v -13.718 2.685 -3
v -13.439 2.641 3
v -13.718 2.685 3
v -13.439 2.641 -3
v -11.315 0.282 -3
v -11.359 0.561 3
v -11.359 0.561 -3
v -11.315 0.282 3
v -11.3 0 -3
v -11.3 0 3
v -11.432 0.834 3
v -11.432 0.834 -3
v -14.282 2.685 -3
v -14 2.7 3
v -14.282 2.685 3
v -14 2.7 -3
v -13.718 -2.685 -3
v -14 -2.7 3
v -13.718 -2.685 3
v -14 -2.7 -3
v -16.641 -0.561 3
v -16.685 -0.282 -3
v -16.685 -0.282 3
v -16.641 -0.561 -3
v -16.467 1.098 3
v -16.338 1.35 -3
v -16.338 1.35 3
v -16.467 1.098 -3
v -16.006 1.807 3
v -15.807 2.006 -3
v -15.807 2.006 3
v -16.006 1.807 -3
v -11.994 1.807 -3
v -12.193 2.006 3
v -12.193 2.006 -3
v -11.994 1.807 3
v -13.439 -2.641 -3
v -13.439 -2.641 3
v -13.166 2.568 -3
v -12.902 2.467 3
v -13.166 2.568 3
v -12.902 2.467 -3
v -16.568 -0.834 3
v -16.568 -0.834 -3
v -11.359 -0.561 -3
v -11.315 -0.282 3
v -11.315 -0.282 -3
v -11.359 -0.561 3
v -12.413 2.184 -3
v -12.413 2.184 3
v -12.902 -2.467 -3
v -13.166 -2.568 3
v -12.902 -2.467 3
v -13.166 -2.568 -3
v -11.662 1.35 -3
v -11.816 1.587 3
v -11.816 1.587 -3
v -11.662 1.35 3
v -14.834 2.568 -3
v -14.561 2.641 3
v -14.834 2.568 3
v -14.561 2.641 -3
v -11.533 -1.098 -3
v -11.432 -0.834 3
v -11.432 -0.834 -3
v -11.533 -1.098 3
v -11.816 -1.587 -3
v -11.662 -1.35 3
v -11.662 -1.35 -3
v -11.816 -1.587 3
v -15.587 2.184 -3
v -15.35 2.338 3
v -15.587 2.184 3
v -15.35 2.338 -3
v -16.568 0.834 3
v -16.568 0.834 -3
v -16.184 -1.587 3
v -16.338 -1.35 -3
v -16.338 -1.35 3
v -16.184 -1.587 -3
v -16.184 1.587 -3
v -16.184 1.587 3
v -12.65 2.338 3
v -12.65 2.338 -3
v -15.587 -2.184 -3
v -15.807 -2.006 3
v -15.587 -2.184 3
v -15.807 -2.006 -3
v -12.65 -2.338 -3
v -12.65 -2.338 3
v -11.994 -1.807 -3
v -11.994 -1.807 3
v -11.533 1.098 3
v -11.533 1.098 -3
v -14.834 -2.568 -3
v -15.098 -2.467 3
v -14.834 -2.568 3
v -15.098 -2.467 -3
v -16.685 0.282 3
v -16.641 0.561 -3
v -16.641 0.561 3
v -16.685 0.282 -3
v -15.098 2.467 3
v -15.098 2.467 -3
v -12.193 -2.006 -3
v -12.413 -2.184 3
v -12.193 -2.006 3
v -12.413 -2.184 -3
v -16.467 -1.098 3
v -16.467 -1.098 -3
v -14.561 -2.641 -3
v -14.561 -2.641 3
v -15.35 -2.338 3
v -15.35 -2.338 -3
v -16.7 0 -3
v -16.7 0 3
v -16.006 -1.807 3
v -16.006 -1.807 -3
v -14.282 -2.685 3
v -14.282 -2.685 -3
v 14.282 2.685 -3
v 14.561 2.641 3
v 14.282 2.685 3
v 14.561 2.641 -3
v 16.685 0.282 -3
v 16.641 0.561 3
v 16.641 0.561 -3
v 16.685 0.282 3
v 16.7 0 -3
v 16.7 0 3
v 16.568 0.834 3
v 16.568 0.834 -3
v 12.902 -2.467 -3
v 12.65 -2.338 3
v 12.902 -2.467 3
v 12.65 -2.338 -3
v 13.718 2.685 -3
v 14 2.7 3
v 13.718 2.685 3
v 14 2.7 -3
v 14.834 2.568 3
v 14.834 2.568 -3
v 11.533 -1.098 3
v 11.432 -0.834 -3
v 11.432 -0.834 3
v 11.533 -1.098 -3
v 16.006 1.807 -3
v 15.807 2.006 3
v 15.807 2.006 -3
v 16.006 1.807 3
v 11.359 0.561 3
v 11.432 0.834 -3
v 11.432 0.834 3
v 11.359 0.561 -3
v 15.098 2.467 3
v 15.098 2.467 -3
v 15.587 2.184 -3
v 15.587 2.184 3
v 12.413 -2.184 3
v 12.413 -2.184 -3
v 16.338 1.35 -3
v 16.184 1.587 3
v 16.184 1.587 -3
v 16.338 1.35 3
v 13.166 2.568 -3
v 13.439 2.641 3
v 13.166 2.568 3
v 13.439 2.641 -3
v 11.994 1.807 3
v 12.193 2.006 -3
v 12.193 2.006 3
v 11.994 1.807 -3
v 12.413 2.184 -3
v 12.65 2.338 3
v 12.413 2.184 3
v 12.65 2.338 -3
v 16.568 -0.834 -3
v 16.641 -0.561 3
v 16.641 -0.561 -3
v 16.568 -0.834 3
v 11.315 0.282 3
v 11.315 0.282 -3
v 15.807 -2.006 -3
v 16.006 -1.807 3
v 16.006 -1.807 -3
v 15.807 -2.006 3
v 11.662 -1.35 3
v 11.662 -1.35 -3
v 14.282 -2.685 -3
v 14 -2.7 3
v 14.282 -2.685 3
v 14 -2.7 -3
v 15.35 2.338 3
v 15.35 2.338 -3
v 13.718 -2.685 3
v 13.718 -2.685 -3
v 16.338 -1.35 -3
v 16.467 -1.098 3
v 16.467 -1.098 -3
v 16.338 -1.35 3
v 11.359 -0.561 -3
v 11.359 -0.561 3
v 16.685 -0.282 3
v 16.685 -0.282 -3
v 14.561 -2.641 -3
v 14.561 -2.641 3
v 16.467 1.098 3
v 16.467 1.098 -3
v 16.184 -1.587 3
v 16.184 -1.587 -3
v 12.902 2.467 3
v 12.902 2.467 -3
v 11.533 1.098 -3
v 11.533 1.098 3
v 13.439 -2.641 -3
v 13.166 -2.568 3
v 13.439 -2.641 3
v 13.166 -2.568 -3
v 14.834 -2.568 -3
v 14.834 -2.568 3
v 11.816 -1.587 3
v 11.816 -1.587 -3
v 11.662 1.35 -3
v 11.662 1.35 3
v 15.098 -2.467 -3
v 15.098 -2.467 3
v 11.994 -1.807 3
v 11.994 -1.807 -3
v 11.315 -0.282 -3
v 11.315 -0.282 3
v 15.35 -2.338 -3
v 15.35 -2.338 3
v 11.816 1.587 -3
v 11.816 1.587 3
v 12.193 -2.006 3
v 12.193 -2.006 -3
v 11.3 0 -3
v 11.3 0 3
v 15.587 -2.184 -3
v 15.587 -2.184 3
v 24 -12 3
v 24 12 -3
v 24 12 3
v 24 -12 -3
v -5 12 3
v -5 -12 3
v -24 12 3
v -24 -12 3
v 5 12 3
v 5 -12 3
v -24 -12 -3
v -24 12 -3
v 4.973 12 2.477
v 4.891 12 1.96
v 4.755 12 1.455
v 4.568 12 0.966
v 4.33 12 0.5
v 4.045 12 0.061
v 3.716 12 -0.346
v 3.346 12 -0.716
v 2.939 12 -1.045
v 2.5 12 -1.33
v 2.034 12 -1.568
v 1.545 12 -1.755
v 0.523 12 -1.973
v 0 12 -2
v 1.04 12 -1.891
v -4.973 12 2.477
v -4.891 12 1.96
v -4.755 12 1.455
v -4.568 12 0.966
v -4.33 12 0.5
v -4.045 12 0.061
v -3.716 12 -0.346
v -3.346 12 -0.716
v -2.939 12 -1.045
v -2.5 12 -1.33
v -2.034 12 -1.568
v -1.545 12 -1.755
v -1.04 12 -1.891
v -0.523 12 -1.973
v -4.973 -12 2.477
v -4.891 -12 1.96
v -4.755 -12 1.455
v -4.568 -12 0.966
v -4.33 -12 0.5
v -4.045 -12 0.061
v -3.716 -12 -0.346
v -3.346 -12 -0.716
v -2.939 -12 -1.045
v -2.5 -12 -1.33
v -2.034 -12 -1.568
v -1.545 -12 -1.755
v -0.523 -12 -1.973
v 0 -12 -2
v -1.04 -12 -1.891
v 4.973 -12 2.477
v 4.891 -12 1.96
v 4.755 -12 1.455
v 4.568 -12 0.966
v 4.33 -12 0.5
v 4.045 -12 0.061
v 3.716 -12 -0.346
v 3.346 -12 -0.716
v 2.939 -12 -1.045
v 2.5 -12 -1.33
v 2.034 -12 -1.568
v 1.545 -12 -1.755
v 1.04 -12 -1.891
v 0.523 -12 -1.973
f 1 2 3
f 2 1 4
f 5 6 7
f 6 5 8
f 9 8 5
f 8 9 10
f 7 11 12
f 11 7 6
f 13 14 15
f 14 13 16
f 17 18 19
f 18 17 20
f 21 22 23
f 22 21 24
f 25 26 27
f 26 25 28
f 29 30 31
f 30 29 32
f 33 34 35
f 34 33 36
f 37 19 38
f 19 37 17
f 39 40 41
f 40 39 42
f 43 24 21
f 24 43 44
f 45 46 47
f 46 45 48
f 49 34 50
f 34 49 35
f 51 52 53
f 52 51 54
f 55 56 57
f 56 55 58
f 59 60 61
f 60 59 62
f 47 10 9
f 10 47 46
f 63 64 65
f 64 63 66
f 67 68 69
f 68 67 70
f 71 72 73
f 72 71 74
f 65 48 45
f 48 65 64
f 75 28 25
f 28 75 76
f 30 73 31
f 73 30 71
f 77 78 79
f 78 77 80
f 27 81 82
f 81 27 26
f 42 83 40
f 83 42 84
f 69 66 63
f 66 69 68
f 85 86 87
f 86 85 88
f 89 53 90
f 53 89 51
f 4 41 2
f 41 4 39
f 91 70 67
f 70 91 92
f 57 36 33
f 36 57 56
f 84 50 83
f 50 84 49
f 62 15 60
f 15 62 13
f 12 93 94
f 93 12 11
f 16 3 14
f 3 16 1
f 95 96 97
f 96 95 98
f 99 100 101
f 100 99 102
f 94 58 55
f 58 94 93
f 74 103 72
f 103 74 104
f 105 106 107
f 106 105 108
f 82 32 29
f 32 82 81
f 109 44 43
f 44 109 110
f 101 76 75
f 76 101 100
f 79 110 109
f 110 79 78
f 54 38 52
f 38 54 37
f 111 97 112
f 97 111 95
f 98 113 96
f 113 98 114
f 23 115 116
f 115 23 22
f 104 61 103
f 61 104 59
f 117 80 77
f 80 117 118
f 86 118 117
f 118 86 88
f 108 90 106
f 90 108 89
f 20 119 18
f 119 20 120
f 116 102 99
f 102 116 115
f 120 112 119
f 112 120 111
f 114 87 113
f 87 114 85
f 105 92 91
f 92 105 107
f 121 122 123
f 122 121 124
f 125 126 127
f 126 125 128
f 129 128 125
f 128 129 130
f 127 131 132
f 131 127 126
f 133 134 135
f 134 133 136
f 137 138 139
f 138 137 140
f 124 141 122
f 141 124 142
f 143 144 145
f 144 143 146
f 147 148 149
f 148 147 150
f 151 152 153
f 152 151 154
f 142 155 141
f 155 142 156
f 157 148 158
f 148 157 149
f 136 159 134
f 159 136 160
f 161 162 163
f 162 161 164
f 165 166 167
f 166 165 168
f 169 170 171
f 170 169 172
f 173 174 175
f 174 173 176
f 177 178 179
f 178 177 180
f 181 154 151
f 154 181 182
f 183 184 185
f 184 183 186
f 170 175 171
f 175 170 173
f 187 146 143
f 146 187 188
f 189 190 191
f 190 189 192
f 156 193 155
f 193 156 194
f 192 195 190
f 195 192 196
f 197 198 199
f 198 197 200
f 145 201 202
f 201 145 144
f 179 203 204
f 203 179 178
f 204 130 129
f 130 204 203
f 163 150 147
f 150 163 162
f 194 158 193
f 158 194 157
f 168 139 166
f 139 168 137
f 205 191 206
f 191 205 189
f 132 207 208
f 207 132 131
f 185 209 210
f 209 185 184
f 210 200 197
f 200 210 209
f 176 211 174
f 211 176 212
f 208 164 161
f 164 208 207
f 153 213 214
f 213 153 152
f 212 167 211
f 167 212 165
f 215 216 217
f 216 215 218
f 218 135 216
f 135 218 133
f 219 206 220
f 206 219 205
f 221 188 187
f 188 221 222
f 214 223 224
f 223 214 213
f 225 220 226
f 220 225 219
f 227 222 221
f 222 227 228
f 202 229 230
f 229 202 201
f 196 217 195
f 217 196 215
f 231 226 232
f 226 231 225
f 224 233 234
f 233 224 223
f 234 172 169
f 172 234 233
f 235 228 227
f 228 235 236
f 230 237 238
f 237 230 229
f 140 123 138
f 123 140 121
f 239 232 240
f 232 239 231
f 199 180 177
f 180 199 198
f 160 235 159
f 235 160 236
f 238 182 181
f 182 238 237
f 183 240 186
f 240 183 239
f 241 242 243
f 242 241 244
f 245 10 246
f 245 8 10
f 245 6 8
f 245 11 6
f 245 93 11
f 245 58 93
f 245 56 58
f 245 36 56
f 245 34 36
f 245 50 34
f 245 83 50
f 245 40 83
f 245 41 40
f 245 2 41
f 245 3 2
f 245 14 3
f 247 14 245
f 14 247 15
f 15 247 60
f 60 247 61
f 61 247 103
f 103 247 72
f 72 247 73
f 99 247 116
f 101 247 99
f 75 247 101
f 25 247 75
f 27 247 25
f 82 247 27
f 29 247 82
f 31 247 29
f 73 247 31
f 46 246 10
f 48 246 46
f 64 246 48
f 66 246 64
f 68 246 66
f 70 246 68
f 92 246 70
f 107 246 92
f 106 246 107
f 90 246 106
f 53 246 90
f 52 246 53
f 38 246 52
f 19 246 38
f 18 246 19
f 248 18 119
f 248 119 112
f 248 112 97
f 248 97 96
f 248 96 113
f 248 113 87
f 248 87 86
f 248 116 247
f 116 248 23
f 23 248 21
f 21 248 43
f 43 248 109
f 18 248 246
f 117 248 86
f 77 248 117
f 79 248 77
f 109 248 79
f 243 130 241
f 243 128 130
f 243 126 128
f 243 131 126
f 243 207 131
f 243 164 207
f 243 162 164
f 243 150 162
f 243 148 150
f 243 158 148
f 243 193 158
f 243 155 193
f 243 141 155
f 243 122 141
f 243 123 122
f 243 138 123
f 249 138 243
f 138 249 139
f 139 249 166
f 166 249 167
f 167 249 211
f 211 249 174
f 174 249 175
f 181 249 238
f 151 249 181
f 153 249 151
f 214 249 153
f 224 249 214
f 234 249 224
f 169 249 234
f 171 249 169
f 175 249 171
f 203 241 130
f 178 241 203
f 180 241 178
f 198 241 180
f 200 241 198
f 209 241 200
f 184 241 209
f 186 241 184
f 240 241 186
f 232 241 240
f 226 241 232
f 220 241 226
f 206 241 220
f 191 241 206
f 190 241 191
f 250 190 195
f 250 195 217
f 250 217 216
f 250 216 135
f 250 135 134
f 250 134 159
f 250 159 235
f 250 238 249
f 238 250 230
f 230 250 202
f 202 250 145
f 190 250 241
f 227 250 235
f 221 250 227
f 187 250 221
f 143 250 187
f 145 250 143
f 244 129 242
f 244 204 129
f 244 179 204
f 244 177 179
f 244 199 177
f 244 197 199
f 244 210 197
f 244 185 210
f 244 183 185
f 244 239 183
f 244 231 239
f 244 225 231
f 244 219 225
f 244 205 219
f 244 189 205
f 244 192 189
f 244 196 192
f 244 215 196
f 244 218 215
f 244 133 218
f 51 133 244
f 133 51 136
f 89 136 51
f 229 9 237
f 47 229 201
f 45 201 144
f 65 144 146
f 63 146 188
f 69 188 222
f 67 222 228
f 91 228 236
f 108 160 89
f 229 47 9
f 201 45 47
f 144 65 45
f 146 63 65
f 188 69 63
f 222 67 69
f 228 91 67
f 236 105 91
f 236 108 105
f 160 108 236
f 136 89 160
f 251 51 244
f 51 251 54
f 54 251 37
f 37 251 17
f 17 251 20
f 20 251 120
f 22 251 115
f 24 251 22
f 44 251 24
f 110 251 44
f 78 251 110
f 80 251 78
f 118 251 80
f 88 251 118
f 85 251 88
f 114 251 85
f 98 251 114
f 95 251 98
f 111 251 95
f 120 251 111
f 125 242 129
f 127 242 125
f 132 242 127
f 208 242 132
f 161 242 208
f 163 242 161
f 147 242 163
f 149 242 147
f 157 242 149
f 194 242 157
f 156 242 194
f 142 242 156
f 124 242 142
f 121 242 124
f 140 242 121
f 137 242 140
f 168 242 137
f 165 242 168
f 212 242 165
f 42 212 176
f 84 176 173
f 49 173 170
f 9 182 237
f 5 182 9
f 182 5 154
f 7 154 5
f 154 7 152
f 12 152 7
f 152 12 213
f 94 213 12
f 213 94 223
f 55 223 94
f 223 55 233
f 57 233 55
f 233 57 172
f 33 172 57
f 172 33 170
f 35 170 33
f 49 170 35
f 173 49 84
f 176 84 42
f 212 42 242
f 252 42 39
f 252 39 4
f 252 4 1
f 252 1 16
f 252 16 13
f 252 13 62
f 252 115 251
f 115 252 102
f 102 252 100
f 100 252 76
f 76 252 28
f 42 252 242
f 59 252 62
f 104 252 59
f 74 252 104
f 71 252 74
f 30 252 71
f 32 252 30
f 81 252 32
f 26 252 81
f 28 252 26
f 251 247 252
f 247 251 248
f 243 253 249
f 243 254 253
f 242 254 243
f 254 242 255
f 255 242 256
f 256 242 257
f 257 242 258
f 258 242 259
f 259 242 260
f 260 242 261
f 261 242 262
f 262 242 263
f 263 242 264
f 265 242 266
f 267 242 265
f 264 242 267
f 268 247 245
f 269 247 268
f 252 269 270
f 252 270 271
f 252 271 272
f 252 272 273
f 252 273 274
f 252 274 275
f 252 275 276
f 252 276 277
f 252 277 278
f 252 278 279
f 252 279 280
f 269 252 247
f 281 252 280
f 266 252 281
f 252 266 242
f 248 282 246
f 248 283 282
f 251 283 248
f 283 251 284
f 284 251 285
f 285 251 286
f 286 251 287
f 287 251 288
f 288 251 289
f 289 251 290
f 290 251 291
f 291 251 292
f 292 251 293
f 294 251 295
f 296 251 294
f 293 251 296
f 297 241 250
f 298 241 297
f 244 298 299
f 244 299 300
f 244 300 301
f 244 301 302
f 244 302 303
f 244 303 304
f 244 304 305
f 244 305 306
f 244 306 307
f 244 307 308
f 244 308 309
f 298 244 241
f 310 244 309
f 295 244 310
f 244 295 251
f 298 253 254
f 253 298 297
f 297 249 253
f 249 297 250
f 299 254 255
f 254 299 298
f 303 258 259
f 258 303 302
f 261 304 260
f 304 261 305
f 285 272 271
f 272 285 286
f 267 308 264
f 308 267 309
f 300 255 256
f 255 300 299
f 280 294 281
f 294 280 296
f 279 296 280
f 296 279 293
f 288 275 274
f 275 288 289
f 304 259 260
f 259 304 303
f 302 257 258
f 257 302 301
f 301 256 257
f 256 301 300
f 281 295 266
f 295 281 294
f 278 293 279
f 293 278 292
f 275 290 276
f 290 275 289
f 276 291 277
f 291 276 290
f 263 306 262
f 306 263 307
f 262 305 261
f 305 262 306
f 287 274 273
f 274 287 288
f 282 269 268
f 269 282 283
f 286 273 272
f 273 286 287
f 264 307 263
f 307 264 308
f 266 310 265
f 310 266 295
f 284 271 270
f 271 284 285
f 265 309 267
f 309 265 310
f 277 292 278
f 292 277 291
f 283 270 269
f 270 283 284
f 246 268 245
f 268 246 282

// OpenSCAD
// Saddle clamp base for round tube.
$fn = 60;
eps = 0.02;
pipe_d = 10;
base_l = 48;
base_w = 24;
base_t = 6;
difference() {
    cube([base_l,base_w,base_t],center=true);
    translate([0,-base_w/2-eps,base_t/2]) rotate([-90,0,0]) cylinder(d=pipe_d,h=base_w+2*eps);
    for (x=[-base_l/2+10,base_l/2-10]) translate([x,0,-base_t/2-eps]) cylinder(d=5.4,h=base_t+2*eps);
}
